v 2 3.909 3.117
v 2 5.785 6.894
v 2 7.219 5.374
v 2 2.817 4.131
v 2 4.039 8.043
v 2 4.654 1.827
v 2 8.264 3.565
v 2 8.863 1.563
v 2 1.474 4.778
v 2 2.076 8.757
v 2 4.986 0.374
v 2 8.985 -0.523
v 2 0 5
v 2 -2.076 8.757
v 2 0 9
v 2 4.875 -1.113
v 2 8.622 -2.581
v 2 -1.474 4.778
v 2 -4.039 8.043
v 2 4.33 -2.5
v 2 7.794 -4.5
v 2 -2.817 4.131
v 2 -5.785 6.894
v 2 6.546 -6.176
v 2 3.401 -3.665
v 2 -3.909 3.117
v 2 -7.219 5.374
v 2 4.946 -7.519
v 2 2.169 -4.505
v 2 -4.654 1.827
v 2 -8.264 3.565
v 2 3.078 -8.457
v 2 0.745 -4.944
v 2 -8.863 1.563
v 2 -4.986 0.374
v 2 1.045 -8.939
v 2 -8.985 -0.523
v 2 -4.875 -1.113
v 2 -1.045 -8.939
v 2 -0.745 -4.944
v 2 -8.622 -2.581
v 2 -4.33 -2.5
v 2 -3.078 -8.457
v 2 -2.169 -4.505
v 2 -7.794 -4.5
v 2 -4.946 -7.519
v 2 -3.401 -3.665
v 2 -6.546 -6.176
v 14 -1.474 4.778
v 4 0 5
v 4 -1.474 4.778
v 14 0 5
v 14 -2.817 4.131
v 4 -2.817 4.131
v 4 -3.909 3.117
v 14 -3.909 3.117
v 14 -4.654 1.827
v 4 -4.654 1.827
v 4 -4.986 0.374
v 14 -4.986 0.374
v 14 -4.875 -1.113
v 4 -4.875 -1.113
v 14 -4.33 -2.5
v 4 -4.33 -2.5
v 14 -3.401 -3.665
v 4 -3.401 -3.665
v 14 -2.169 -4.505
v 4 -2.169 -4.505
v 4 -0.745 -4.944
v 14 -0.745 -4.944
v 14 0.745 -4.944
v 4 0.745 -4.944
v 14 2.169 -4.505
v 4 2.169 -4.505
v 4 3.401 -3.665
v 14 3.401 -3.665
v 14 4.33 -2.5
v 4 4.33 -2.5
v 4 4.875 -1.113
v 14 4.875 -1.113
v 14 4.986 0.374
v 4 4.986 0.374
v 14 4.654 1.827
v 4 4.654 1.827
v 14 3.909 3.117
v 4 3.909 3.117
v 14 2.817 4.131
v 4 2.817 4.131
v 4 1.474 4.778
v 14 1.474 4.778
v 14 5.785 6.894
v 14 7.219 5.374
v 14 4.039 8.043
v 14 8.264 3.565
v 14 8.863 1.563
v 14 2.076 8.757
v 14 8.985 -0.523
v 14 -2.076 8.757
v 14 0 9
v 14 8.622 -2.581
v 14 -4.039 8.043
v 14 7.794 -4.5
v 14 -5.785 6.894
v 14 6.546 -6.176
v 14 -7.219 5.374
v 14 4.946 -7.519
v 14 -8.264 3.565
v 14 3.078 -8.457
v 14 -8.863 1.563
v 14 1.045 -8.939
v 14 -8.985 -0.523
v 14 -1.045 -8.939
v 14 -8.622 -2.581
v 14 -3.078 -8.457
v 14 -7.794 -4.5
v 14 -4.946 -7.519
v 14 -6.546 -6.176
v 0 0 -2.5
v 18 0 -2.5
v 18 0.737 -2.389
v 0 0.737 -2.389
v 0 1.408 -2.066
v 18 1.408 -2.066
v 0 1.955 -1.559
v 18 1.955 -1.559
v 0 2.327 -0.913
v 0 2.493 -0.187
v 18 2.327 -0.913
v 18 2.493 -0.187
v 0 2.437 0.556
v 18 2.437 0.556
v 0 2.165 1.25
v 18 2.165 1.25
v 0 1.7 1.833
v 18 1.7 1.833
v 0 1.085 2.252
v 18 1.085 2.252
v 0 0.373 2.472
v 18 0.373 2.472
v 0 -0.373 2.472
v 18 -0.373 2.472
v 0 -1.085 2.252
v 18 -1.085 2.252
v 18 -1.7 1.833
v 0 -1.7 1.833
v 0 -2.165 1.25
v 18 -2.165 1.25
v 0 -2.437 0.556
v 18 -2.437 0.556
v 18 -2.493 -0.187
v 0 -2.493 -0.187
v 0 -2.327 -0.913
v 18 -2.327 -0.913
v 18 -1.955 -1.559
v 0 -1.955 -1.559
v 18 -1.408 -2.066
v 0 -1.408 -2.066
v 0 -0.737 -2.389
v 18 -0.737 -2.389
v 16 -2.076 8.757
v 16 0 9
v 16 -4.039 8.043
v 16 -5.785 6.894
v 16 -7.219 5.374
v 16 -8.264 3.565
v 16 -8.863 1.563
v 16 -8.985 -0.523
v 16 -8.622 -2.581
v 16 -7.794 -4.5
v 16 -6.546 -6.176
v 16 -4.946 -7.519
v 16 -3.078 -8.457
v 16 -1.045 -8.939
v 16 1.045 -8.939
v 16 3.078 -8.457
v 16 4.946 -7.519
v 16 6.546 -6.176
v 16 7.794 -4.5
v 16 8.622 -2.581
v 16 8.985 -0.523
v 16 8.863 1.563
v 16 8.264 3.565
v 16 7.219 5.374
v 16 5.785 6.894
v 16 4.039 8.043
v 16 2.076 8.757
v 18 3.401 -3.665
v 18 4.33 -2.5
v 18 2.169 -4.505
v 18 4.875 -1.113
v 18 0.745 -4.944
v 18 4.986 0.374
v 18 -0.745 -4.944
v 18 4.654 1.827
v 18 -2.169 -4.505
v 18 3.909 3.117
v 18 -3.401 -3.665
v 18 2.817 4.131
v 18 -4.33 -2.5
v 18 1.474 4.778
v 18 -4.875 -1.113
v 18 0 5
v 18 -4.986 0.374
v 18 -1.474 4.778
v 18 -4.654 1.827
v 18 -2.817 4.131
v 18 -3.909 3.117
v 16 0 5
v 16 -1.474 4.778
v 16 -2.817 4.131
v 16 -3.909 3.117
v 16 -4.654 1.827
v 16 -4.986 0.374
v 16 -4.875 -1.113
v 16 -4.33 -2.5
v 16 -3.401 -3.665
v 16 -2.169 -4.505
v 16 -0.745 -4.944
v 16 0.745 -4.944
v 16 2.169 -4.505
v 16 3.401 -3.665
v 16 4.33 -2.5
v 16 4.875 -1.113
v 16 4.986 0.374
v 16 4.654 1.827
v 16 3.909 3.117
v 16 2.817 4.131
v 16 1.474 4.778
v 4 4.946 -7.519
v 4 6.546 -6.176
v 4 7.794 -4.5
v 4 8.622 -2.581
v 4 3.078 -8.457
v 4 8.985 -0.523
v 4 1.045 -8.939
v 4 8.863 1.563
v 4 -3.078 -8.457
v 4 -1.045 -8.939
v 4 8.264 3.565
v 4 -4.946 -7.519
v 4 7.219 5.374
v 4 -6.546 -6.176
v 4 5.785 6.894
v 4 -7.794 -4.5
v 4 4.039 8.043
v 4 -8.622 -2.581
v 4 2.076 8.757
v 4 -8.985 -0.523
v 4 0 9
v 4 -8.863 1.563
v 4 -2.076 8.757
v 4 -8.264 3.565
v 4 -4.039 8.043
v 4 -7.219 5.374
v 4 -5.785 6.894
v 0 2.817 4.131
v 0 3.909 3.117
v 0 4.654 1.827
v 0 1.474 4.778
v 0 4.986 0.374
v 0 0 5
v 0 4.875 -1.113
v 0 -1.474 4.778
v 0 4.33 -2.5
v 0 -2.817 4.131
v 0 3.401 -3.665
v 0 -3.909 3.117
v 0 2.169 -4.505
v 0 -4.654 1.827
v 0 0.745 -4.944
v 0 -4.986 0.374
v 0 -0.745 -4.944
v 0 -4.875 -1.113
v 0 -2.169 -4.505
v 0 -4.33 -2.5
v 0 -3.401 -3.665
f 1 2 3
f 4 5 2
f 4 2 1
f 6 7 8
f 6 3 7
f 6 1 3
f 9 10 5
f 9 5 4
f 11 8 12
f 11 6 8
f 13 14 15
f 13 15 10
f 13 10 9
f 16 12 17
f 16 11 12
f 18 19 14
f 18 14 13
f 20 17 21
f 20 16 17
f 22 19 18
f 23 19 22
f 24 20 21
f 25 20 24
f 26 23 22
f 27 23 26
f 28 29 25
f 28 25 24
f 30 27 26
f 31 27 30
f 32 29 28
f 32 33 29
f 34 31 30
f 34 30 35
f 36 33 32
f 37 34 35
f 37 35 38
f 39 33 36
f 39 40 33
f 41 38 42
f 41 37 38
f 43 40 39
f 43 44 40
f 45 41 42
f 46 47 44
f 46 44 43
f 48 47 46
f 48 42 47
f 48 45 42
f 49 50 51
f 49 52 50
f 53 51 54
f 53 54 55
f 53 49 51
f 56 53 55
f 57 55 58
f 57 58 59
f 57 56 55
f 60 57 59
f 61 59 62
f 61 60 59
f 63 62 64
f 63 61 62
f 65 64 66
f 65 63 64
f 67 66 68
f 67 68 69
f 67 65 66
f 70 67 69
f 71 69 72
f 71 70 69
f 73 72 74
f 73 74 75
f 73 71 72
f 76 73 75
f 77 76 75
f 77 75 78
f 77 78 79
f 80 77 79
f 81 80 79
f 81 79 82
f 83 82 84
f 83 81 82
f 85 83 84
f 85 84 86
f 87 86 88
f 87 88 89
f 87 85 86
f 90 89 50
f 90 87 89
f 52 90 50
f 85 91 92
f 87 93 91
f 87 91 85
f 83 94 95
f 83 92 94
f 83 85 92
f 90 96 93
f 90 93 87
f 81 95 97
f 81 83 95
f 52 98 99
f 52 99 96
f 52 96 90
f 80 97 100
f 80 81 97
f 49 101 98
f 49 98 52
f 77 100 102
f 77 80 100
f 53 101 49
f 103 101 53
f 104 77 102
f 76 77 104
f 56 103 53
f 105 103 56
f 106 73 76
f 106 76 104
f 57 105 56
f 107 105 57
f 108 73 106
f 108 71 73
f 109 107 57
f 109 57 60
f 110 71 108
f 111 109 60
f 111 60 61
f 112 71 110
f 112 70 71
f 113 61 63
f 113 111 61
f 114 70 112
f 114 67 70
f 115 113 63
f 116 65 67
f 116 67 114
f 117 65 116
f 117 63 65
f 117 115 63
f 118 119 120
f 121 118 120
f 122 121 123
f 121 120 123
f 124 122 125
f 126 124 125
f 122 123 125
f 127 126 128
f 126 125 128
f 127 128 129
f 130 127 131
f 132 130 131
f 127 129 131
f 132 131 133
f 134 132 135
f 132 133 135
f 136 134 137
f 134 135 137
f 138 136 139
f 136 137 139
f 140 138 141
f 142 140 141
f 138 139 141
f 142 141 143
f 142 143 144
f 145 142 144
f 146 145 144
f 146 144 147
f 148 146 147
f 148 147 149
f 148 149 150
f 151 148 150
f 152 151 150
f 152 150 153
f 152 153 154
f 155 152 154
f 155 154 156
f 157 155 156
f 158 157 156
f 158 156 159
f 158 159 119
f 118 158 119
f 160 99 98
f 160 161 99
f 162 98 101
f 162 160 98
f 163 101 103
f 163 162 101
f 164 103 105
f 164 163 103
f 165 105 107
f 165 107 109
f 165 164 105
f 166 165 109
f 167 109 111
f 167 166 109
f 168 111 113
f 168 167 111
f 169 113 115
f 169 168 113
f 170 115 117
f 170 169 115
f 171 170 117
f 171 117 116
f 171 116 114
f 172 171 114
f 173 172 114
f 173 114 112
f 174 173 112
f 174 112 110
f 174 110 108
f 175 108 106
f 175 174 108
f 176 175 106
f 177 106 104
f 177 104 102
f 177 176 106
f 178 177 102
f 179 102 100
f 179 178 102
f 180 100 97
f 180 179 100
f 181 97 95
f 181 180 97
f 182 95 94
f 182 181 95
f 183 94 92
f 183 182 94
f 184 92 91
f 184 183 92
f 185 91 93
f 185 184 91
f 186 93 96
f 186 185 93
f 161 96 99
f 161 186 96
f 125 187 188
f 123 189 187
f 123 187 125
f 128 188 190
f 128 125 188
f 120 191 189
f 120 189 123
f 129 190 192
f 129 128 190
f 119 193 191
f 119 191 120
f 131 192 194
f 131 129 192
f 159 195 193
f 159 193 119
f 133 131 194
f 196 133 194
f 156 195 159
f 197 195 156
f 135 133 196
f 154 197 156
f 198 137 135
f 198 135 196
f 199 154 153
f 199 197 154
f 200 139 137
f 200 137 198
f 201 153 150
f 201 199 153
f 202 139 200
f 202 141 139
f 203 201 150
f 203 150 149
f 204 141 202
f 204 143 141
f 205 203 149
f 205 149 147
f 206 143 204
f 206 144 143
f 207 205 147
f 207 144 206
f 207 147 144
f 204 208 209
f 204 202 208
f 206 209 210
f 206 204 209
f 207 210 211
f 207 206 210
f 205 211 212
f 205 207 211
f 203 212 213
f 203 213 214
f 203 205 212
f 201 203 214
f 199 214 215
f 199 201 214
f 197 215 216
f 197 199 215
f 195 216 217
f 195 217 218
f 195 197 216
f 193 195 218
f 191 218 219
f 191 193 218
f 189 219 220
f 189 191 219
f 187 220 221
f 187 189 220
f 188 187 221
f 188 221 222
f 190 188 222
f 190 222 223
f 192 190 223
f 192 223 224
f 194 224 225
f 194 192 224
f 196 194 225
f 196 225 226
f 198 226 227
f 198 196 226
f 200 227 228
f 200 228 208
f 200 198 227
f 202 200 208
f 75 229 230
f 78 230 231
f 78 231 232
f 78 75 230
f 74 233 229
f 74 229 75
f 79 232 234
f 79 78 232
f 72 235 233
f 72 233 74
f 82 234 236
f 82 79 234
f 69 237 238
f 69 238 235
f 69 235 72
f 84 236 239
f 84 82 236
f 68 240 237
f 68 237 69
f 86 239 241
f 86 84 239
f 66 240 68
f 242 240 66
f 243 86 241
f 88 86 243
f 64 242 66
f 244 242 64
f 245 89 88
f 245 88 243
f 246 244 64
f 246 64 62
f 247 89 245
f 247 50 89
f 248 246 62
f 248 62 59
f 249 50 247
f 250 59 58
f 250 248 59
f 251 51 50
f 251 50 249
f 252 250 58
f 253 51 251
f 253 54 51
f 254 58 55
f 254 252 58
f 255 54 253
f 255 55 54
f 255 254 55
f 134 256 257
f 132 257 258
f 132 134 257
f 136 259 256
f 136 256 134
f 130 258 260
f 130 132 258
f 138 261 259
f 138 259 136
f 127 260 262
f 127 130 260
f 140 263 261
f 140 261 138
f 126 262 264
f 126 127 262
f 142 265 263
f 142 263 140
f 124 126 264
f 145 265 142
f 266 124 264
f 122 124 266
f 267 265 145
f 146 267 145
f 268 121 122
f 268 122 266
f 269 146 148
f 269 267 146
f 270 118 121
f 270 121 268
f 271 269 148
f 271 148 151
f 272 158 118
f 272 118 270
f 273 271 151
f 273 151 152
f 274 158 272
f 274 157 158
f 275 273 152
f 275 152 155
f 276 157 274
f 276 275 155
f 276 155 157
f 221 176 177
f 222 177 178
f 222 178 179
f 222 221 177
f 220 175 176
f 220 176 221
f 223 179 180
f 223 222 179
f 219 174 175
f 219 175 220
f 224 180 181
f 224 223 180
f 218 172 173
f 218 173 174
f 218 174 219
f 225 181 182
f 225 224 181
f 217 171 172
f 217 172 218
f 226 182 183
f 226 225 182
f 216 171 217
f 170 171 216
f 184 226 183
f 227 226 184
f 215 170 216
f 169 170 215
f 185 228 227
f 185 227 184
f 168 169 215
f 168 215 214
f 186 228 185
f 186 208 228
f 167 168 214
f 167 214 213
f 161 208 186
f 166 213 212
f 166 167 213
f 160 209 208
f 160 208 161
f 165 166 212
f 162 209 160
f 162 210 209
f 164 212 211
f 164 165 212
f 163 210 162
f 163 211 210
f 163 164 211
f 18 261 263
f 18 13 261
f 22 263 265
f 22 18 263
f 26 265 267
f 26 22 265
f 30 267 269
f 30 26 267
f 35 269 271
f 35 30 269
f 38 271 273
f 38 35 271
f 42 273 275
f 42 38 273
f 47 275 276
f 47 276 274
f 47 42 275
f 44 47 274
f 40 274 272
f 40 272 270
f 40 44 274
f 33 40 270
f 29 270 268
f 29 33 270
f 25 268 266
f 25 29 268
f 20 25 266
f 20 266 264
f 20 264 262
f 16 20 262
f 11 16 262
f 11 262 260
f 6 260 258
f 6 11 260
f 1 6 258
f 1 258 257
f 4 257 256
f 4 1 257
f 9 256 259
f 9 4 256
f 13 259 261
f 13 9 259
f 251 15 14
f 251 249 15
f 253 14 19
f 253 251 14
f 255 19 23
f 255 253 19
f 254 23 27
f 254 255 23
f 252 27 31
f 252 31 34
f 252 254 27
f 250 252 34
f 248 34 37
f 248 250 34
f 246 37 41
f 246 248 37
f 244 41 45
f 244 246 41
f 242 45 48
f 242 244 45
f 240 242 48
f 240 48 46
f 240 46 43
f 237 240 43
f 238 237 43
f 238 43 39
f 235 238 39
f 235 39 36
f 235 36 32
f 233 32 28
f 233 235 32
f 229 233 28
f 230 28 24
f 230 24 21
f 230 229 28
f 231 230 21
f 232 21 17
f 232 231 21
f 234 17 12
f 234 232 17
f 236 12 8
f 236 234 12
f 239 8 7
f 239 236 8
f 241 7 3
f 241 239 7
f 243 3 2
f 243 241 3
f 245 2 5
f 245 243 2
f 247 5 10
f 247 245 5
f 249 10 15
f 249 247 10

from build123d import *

# Parameters (mm, degrees)
SKETCH2_R          = 2.5
CUT_EXTRUDE1_DEPTH = 23.045407685


with BuildPart() as part:
    # Sketch1 → Revolve1 (revolve)
    with BuildSketch(Plane.XY, mode=Mode.PRIVATE) as revolve1_sk:
        Polygon((0, 0), (0, 5), (2, 5), (2, 9), (4, 9), (4, 5), (14, 5), (14, 9), (16, 9), (16, 5), (18, 5), (18, 0), align=None)
    revolve(revolve1_sk.sketch.rotate(Axis((0, 0, 0), (1, 0, 0)), 90), axis=Axis((0, 0, 0), (1, 0, 0)))

    # Sketch2 → Cut-Extrude1 (cut, through all)
    with BuildSketch(Plane(origin=(18, 0, 0), x_dir=(0, 0, -1), z_dir=(1, 0, 0))):
        Circle(SKETCH2_R)
    extrude(amount=-CUT_EXTRUDE1_DEPTH, mode=Mode.SUBTRACT)


solid = part.part
